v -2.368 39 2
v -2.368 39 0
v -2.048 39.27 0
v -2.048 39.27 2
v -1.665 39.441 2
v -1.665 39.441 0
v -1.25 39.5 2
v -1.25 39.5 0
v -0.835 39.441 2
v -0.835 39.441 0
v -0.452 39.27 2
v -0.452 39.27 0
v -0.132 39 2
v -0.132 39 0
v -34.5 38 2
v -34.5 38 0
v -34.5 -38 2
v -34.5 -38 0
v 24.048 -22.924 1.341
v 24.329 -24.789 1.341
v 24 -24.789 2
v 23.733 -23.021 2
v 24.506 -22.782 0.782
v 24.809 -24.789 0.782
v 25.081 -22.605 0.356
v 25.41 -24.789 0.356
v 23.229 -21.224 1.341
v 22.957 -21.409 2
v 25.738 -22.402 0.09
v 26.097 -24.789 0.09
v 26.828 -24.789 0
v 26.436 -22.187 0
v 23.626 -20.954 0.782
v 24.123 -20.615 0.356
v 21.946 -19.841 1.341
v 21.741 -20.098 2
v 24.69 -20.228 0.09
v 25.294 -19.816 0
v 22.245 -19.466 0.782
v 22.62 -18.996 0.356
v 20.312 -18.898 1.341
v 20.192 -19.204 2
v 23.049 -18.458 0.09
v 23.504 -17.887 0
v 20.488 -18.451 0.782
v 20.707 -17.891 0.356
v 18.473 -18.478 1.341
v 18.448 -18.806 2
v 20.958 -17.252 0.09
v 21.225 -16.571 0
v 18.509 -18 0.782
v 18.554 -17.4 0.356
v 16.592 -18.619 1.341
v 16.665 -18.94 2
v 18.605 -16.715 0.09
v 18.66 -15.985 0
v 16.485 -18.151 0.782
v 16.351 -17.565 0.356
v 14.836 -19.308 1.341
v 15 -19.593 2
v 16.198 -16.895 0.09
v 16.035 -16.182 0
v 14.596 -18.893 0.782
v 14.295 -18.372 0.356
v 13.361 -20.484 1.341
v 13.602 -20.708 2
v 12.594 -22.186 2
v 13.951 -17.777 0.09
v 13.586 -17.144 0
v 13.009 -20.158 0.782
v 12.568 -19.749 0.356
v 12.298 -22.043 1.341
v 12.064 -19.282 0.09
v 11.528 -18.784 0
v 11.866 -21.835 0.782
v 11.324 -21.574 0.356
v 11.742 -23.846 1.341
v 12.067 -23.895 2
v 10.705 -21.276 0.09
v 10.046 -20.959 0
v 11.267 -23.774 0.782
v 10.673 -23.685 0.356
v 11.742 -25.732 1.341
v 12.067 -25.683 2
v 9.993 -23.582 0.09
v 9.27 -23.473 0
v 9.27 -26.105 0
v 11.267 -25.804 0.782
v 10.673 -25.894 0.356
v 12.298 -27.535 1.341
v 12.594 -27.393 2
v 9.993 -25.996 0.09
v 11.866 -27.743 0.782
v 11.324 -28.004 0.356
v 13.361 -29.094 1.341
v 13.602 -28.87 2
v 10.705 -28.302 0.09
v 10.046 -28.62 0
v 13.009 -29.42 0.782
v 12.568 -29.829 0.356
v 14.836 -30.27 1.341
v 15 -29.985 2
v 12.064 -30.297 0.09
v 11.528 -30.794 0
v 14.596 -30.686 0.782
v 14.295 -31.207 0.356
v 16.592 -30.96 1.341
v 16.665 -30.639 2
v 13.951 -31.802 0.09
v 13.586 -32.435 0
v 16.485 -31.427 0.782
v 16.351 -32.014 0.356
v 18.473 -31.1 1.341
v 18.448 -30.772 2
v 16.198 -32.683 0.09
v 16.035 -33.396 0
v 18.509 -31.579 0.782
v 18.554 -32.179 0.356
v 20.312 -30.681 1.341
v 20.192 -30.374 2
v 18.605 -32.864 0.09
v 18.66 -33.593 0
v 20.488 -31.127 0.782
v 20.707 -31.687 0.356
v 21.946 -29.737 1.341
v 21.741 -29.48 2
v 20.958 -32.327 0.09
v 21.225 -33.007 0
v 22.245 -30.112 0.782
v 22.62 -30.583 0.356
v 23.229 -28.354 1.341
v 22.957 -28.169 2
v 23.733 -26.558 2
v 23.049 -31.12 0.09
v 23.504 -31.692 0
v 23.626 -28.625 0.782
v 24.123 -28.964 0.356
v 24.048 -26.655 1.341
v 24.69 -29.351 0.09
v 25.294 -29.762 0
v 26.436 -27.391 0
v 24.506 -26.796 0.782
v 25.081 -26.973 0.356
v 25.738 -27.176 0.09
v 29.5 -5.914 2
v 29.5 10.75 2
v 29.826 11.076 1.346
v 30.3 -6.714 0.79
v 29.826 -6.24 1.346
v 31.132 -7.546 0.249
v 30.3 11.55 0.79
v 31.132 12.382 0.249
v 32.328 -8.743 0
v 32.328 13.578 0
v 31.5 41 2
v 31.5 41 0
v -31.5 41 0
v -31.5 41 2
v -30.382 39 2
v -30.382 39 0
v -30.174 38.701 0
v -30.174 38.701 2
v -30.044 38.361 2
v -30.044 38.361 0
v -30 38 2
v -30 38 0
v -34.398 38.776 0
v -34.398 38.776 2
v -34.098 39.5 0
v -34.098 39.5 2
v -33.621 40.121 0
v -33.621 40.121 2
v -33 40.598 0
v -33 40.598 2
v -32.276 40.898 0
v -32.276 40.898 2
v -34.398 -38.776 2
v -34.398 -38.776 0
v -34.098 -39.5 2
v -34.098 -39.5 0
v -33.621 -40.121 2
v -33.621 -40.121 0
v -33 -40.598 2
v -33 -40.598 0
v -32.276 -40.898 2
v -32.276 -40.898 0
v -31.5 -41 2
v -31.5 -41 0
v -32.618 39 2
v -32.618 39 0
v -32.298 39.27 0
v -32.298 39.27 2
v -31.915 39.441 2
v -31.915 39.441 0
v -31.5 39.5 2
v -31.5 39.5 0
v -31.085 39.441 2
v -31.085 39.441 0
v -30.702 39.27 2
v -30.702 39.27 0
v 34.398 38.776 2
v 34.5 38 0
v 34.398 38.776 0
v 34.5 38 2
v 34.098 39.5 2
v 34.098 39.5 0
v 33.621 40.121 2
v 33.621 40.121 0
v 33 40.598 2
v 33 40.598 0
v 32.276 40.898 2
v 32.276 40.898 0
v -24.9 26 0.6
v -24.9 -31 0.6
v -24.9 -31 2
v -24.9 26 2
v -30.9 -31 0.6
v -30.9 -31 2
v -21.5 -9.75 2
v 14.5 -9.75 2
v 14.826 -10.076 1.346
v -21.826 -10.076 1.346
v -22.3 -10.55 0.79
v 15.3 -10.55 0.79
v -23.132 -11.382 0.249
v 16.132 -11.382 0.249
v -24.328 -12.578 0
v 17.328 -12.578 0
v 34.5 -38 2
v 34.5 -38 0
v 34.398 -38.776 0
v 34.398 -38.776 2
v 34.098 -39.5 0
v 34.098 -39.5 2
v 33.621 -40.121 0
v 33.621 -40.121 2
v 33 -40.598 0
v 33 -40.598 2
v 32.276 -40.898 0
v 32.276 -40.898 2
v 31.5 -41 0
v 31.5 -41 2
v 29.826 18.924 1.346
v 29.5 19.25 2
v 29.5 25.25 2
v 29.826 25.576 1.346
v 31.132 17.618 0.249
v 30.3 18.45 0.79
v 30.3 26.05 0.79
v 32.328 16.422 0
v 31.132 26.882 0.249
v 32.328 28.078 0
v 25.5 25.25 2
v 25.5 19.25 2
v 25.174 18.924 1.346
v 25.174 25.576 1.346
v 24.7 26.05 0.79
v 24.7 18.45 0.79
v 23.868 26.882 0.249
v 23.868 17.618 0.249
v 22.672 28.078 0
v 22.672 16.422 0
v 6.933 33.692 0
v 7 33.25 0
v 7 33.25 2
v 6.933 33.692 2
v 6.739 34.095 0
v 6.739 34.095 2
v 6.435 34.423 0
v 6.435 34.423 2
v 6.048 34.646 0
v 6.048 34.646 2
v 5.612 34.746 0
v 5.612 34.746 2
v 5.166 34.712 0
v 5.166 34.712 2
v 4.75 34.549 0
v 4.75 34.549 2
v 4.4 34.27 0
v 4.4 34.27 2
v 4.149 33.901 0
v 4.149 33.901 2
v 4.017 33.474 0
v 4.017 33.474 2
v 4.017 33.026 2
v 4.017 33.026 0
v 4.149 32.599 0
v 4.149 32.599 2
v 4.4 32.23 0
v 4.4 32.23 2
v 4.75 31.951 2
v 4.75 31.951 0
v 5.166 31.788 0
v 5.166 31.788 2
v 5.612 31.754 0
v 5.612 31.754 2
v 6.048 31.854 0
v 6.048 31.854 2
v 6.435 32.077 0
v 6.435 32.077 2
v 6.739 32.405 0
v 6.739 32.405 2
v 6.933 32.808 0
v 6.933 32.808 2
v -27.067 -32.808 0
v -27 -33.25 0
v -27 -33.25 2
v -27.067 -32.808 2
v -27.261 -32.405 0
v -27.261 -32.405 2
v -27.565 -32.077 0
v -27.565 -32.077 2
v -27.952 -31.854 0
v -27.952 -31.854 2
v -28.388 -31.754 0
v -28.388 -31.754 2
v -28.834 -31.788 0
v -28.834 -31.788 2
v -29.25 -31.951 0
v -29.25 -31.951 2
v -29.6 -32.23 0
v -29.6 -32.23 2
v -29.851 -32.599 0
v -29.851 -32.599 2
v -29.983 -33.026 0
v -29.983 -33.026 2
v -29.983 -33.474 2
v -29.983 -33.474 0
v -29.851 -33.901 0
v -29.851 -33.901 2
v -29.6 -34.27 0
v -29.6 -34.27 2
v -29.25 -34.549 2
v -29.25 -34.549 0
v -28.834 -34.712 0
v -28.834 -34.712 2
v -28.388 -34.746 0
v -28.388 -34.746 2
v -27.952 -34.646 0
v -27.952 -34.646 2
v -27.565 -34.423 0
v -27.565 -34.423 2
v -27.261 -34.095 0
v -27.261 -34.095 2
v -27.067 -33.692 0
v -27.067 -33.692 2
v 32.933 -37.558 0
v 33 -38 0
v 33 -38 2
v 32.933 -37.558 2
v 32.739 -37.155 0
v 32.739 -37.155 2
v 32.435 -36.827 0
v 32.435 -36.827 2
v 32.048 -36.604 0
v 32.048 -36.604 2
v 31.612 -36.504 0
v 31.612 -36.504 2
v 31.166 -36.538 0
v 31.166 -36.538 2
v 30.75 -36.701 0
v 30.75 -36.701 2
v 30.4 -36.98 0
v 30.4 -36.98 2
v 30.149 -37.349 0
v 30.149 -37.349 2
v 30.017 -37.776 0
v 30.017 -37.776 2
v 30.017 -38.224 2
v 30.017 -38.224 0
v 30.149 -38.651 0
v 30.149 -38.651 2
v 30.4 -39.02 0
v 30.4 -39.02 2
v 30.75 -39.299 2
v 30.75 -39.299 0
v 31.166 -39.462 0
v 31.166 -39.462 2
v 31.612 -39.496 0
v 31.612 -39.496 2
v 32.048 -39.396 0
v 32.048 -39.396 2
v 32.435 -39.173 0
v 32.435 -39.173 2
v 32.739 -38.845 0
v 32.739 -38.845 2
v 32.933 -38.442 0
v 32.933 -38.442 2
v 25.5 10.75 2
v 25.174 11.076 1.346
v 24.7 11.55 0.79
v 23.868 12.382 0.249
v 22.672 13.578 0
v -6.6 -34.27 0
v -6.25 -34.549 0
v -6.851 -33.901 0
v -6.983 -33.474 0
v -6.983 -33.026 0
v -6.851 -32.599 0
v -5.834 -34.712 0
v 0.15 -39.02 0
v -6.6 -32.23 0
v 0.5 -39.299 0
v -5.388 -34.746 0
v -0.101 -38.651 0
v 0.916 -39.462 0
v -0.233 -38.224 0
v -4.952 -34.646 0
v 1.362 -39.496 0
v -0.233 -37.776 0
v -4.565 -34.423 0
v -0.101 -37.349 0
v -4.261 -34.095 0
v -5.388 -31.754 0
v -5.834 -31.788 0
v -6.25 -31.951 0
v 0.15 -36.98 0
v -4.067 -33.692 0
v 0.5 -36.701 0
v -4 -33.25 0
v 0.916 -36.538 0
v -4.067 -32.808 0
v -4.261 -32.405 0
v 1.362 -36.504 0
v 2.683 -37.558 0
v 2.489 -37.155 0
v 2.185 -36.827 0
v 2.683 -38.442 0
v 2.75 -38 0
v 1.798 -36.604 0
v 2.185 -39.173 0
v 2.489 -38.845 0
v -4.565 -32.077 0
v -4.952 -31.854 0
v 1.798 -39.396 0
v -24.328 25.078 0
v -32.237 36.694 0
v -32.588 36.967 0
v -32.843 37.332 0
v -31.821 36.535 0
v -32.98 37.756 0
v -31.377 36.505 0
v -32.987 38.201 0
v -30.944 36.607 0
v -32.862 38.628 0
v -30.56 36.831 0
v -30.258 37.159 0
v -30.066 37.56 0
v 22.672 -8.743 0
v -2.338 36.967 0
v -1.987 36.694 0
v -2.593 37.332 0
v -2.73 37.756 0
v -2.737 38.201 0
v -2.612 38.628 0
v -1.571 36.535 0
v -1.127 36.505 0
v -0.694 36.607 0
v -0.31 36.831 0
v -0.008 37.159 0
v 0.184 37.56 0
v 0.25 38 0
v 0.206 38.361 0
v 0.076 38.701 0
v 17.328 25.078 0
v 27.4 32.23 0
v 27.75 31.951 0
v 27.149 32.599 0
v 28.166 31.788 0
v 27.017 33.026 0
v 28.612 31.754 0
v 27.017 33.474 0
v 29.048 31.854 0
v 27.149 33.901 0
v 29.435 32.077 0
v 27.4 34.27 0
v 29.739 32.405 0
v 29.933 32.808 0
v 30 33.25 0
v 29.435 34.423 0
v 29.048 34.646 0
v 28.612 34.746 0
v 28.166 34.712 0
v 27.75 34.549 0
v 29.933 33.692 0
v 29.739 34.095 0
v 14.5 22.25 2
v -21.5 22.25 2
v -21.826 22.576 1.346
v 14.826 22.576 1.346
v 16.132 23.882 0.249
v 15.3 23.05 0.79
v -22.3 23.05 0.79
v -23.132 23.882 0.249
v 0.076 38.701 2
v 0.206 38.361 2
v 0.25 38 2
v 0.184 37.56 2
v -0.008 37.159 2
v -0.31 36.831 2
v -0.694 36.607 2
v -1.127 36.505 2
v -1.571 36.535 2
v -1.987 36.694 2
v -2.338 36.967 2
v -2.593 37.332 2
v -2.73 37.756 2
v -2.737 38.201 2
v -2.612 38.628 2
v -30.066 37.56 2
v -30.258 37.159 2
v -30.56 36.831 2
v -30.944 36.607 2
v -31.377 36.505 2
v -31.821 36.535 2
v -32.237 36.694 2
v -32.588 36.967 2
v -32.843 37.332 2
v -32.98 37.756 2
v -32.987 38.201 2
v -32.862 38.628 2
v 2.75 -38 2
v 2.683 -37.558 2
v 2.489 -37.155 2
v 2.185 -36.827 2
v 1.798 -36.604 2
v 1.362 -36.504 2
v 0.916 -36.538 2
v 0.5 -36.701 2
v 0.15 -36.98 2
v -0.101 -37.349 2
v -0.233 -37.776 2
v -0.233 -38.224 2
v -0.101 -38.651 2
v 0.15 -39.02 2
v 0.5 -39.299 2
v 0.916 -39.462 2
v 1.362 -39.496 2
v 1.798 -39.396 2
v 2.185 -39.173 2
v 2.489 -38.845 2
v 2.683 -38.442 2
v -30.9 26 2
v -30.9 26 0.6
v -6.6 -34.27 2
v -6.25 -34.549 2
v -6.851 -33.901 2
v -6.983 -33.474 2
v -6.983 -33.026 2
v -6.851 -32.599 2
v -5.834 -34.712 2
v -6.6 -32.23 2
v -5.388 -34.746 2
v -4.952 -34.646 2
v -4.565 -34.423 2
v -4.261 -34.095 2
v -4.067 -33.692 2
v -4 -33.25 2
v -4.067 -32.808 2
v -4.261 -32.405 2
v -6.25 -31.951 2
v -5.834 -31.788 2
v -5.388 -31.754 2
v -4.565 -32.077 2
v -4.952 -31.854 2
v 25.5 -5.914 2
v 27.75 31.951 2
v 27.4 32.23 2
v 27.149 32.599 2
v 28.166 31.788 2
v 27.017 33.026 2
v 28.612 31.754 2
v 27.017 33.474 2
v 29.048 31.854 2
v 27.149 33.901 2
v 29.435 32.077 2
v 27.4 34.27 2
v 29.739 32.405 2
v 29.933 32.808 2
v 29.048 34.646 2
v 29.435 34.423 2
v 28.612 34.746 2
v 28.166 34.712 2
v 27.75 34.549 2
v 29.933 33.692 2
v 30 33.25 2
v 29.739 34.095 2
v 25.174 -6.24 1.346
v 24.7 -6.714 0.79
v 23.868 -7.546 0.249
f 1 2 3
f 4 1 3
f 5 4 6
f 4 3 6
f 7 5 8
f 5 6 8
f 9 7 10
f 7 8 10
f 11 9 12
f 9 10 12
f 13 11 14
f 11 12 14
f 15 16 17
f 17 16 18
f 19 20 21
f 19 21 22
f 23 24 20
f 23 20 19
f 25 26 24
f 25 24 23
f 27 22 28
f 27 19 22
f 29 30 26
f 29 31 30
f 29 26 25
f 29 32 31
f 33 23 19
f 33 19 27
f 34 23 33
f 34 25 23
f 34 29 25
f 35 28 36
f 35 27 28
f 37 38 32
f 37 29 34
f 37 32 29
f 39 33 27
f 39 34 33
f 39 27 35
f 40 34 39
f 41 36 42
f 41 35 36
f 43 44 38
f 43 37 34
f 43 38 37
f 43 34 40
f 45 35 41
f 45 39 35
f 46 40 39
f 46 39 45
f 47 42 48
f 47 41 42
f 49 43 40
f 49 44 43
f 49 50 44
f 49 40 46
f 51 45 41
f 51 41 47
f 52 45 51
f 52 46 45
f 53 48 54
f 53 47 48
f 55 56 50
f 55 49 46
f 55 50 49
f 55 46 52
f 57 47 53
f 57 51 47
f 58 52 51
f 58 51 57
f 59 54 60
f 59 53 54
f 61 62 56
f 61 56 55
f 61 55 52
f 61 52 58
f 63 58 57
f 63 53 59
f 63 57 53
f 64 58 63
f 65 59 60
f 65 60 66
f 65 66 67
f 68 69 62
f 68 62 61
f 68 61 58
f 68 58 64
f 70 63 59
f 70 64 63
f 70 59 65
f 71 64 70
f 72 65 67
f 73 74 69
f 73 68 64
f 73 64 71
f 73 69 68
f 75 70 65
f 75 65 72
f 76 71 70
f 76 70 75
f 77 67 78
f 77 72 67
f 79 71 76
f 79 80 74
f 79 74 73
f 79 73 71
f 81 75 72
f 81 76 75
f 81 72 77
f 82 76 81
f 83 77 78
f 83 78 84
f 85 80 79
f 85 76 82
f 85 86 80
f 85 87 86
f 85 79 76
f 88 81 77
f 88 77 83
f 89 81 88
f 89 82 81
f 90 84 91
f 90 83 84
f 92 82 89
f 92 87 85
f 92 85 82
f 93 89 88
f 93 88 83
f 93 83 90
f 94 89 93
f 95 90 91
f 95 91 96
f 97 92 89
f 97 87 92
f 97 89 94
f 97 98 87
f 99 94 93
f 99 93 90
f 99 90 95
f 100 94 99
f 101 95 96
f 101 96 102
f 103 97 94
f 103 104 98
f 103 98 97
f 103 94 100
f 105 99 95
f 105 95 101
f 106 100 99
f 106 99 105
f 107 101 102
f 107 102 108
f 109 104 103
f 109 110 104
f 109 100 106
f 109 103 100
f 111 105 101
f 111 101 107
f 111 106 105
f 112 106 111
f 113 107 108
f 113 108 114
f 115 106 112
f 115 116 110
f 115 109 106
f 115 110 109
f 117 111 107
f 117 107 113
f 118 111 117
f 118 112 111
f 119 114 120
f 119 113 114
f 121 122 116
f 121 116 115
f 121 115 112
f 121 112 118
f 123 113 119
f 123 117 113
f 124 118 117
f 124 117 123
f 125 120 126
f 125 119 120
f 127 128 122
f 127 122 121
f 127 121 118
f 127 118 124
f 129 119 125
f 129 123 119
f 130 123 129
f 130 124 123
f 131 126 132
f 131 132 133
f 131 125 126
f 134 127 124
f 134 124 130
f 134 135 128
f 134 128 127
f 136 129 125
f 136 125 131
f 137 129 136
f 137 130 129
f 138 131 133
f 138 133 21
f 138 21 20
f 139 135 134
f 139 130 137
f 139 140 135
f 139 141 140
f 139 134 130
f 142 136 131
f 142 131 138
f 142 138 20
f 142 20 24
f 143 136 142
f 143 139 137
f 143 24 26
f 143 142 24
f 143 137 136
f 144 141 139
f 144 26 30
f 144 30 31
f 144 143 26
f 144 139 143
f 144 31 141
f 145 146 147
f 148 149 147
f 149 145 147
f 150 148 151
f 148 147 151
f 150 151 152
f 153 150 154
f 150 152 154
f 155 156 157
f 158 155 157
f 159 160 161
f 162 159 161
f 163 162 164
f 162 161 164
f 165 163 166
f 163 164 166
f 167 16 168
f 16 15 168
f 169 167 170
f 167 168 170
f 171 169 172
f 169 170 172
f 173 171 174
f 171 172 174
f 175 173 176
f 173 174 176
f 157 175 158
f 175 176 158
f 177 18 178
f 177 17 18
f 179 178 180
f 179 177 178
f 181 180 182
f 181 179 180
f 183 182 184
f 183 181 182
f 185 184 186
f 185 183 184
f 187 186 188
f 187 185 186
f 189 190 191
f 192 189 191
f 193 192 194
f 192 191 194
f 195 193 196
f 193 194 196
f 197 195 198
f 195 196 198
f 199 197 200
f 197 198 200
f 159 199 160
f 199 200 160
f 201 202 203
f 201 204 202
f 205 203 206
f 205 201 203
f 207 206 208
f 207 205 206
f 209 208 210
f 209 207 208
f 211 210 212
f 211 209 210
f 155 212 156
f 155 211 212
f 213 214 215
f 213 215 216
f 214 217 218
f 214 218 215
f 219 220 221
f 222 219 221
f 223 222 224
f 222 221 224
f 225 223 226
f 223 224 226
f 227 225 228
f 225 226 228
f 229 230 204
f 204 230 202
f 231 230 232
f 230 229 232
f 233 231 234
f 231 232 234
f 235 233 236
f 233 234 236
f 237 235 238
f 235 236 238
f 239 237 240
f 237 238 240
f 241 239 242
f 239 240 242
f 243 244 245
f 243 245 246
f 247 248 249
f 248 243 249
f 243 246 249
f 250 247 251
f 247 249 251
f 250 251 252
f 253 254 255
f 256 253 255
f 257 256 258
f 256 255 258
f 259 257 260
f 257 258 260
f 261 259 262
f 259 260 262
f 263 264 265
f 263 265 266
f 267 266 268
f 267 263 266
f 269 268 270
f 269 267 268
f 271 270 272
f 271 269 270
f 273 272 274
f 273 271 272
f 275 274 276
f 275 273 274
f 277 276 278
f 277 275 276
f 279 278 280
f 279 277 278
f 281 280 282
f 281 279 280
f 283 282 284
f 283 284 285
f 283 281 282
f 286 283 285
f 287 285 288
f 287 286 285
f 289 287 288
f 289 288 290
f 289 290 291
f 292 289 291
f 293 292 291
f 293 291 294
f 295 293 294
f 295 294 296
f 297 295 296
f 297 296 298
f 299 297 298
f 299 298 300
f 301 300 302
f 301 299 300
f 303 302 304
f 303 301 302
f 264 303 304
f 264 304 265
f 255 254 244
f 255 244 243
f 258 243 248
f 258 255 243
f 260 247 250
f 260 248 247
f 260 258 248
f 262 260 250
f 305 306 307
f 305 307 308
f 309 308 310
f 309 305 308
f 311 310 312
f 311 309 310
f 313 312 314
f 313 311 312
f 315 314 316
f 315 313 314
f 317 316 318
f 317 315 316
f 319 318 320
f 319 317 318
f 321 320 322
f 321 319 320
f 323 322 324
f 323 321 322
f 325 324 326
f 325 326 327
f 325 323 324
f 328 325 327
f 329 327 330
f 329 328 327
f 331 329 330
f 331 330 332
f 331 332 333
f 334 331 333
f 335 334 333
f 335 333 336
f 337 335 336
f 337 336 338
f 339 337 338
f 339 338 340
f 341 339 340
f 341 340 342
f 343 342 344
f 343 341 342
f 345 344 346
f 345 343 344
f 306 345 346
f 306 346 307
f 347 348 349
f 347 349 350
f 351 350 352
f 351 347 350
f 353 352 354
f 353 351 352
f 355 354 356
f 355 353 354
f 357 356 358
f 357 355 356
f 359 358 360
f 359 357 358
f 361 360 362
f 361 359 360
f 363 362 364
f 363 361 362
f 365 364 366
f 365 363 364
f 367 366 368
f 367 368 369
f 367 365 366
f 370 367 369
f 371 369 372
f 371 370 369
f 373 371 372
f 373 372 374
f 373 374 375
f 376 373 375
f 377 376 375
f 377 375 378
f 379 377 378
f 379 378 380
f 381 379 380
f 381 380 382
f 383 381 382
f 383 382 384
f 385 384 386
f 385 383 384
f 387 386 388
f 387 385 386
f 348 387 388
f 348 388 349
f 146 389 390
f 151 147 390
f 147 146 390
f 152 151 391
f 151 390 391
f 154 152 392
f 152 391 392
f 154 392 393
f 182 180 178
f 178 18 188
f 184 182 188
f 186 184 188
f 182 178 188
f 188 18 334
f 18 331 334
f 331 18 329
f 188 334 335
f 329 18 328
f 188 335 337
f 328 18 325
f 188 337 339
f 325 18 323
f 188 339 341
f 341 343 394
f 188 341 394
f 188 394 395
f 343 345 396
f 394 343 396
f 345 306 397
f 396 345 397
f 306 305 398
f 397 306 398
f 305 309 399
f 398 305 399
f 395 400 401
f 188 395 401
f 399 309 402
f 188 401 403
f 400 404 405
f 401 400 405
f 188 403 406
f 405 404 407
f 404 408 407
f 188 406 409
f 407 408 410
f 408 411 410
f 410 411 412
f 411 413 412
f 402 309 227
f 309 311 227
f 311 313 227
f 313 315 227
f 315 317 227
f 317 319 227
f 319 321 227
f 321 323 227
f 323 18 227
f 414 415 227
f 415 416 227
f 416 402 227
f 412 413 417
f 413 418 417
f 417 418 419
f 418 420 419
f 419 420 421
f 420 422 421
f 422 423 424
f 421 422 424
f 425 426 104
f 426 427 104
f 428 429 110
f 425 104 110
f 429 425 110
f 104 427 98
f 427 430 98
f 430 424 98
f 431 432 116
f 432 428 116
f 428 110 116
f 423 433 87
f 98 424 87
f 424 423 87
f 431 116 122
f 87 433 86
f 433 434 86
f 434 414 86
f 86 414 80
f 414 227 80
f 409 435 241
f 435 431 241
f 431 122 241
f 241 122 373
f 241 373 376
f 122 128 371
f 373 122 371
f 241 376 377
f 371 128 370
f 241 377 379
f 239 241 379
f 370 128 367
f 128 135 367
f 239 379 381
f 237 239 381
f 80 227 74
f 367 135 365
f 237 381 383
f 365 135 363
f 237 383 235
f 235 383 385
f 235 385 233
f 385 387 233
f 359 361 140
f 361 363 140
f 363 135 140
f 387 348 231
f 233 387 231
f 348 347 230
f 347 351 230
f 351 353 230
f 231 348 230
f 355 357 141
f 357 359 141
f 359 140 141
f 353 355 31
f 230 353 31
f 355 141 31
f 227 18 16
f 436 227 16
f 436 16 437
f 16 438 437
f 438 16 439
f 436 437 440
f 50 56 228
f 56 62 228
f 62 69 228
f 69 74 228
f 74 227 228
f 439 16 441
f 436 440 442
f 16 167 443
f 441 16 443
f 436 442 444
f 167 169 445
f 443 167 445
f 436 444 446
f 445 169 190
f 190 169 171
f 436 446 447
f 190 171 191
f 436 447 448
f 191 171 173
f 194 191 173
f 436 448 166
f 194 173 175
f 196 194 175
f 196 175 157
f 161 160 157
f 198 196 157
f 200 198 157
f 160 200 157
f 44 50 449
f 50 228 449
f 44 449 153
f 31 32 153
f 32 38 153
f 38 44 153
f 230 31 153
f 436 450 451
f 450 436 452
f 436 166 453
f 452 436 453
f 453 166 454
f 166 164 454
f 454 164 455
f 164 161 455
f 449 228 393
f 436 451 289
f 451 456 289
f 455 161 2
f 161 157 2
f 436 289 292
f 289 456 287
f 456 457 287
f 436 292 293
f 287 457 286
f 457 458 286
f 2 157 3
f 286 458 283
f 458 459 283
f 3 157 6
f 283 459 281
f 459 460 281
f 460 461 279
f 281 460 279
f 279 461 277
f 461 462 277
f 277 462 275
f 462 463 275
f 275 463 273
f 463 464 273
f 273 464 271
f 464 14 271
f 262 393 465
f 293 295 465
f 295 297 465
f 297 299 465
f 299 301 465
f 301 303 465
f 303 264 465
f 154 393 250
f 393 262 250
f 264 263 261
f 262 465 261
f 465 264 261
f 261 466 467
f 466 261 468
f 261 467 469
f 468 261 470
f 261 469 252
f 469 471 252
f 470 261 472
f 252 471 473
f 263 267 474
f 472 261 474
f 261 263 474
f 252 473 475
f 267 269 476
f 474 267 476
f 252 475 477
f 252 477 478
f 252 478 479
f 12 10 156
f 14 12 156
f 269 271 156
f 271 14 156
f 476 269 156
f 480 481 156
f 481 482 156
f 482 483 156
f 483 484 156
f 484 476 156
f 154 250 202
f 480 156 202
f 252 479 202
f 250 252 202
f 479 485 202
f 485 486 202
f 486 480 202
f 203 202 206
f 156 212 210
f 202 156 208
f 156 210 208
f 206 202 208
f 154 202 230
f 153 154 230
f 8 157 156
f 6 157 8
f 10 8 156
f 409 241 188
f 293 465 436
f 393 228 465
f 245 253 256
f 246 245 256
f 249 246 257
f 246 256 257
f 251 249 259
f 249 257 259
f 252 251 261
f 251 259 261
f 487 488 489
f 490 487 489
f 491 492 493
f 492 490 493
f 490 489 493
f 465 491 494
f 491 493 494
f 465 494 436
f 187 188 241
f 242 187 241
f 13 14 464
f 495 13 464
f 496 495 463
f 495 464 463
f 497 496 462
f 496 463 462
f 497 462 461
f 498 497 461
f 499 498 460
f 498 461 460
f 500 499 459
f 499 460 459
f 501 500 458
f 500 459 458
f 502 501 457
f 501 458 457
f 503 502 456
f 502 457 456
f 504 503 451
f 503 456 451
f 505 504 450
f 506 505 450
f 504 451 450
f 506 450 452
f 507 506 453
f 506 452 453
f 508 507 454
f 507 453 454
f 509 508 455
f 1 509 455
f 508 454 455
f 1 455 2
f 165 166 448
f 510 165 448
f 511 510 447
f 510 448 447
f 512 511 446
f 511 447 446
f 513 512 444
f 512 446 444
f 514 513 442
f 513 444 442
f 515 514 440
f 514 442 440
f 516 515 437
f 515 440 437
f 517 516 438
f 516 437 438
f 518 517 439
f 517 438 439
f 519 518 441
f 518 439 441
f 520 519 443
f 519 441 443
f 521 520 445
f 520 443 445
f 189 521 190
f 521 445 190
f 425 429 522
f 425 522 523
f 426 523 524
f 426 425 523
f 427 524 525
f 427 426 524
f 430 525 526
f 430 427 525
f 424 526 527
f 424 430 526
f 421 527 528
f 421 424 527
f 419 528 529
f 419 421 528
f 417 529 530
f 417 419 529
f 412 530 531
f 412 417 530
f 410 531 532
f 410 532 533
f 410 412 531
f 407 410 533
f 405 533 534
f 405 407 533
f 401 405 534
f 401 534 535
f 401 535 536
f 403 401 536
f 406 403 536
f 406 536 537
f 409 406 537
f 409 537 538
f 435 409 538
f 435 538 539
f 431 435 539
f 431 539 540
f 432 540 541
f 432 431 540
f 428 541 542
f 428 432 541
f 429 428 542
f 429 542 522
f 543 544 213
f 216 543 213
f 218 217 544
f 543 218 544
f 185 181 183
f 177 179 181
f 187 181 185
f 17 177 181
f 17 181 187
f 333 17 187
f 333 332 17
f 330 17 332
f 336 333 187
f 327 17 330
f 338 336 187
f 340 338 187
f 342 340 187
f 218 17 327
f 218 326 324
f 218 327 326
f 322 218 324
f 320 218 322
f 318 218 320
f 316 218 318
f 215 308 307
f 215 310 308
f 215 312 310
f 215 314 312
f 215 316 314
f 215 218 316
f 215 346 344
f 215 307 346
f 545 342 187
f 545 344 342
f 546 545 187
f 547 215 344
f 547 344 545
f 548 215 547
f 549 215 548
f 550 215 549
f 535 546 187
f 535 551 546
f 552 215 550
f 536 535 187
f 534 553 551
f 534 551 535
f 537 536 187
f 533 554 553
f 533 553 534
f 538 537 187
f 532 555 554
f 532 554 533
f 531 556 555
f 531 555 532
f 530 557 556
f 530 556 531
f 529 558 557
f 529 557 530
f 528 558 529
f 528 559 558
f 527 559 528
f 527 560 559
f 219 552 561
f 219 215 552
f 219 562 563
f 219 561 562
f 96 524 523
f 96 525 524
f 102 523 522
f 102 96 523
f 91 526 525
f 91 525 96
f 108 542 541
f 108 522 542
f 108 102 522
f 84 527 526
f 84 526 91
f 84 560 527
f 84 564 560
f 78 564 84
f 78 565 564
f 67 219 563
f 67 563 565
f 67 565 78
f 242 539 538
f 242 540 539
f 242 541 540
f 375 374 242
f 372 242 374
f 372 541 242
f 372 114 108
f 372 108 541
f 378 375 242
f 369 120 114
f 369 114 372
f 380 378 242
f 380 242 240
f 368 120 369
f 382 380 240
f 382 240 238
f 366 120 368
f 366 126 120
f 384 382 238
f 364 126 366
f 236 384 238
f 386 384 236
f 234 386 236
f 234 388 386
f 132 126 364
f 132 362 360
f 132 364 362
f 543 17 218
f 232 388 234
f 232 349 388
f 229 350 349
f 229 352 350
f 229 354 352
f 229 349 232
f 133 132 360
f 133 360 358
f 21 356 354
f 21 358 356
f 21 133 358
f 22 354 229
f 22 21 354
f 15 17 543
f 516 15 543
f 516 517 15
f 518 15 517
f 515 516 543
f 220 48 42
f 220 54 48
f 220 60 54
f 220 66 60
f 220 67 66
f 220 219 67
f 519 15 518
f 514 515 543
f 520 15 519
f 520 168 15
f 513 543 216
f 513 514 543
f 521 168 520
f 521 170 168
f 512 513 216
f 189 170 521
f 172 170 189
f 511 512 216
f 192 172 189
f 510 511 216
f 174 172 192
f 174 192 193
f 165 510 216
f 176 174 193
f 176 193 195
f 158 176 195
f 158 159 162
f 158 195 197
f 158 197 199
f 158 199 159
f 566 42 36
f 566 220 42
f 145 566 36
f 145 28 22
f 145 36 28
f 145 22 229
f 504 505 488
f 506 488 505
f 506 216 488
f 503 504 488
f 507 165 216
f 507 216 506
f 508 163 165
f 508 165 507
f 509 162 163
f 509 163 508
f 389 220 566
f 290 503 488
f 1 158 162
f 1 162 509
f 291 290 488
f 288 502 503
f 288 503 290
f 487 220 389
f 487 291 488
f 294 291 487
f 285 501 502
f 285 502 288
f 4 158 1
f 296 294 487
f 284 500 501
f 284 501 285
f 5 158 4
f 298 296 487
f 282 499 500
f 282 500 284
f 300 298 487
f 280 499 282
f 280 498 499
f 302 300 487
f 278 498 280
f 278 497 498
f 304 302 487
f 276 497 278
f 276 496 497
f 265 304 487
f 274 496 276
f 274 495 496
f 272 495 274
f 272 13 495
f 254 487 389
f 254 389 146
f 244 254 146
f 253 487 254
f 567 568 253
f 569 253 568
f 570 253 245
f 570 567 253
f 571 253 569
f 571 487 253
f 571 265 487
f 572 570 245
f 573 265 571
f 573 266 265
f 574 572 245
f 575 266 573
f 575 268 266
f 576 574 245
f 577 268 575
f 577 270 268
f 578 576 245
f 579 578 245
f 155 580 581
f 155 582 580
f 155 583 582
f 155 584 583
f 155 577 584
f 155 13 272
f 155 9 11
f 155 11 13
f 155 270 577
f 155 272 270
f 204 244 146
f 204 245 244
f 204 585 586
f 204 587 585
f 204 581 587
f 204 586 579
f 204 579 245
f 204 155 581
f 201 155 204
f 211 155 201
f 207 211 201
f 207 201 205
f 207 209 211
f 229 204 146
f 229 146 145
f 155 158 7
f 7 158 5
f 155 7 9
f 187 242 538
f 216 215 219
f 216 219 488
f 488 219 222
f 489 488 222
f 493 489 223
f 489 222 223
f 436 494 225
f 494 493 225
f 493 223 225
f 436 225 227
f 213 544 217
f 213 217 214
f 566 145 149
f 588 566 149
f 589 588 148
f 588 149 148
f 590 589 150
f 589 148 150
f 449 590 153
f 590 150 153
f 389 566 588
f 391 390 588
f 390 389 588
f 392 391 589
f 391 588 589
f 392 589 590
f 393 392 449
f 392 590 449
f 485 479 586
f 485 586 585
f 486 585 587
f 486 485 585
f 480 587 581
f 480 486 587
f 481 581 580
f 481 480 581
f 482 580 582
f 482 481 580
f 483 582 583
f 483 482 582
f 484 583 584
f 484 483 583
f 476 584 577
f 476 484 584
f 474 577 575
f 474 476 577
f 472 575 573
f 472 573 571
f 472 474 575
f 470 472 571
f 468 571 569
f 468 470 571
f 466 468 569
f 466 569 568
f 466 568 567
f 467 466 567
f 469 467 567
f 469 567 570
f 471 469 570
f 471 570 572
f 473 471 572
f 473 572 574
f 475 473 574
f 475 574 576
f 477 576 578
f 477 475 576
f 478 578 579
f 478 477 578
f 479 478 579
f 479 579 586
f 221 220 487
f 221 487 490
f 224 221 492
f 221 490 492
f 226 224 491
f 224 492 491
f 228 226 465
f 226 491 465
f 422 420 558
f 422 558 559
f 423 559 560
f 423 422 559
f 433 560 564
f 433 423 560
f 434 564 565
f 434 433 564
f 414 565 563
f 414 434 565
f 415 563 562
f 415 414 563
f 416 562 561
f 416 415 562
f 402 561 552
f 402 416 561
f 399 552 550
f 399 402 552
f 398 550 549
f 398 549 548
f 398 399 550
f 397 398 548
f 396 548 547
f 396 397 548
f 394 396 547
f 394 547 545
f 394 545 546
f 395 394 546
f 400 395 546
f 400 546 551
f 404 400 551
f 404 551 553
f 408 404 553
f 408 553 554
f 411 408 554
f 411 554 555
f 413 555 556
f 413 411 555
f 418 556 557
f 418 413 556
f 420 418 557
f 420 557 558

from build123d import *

# Parameters (mm, degrees)
F0_R          = 1.5
F0_R_2        = 6
F0_W          = 6
F0_H          = 57
F0_W_2        = 36
F0_H_2        = 32
F0_W_3        = 4
F0_H_3        = 16.6644380502
F0_H_4        = 6
F0_W_4        = 4.7
F0_H_5        = 2
F0_W_5        = 13
F0_W_6        = 2.3
F0_W_7        = 1.5
F0_W_8        = 9
F0_W_9        = 11
F1_DEPTH      = 2
F2_T1_DEPTH   = 16.6644380502
F2_T3_DEPTH   = 4
F2_T5_DEPTH   = 6
F2_T7_DEPTH   = 32
F2_T9_DEPTH   = 36
F2_T17_DEPTH  = 11.0710678119
F2_T21_DEPTH  = 23.7355058621
F2_T28_DEPTH  = 11.0710678119
F2_T32_DEPTH  = 23.7355058621
F2_T39_DEPTH  = 23.7355058621
F2_T43_DEPTH  = 11.0710678119
F2_T51_DEPTH  = 11.0710678119
F2_T56_DEPTH  = 23.7355058621
F2_T63_DEPTH  = 13.0710678119
F2_T67_DEPTH  = 11.0710678119
F2_T75_DEPTH  = 13.0710678119
F2_T79_DEPTH  = 11.0710678119
F2_T86_DEPTH  = 11.0710678119
F2_T91_DEPTH  = 13.0710678119
F2_S93_R      = 1.5
F2_T94_DEPTH  = 8
F2_T100_DEPTH = 13.0710678119
F2_T104_DEPTH = 11.0710678119
F2_T111_DEPTH = 43.0710678119
F2_T115_DEPTH = 39.0710678119
F2_T122_DEPTH = 39.0710678119
F2_T126_DEPTH = 43.0710678119
F2_T133_DEPTH = 39.0710678119
F2_T137_DEPTH = 43.0710678119
F2_T145_DEPTH = 39.0710678119
F2_T149_DEPTH = 43.0710678119
F3_R          = 3
F4_DEPTH      = 0.6


# Not quite as in the source:
# - a fillet or chamfer that OpenCascade refuses, or shapes differently, is made with other operations: its cross-section is extruded or revolved along the edge and cut away or added


with BuildPart() as f1:
    # F0 (on Top) → F1 (new body)
    with BuildSketch(Plane.XY):
        with BuildLine():
            Line((12.5, -41), (34.5, -41))
            Line((34.5, -41), (34.5, 39))
            Line((34.5, 39), (28.5, 39))
            Line((28.5, 39), (25.5, 39))
            Line((25.5, 39), (20.8, 39))
            Line((20.8, 39), (7.8, 39))
            Line((7.8, 39), (5.5, 39))
            Line((5.5, 39), (-0.1319660113, 39))
            ThreePointArc((-0.1319660113, 39), (0.1512585384, 38.5352331347), (0.25, 38))
            ThreePointArc((0.25, 38), (-1.7852331347, 36.5987414616), (-2.3680339887, 39))
            Line((-2.3680339887, 39), (-5.5, 39))
            Line((-5.5, 39), (-14.5, 39))
            Line((-14.5, 39), (-25.5, 39))
            Line((-25.5, 39), (-27, 39))
            Line((-27, 39), (-28.5, 39))
            Line((-28.5, 39), (-30.3819660113, 39))
            ThreePointArc((-30.3819660113, 39), (-30.0987414616, 38.5352331347), (-30, 38))
            ThreePointArc((-30, 38), (-32.0352331347, 36.5987414616), (-32.6180339887, 39))
            Line((-32.6180339887, 39), (-34.5, 39))
            Line((-34.5, 39), (-34.5, -41))
            Line((-34.5, -41), (-12.5, -41))
            Line((-12.5, -41), (-10.5, -41))
            Line((-10.5, -41), (10.5, -41))
            Line((10.5, -41), (12.5, -41))
        make_face()
        with Locations((-28.5, -33.25)):
            Circle(F0_R, mode=Mode.SUBTRACT)
        with Locations((-5.5, -33.25)):
            Circle(F0_R, mode=Mode.SUBTRACT)
        with Locations((1.25, -38)):
            Circle(F0_R, mode=Mode.SUBTRACT)
        with Locations((31.5, -38)):
            Circle(F0_R, mode=Mode.SUBTRACT)
        with Locations((18, -24.7891994715)):
            Circle(F0_R_2, mode=Mode.SUBTRACT)
        with Locations((-27.9, -2.5)):
            Rectangle(F0_W, F0_H, mode=Mode.SUBTRACT)
        with Locations((-3.5, 6.25)):
            Rectangle(F0_W_2, F0_H_2, mode=Mode.SUBTRACT)
        with Locations((-28.5, 33.25)):
            Circle(F0_R, mode=Mode.SUBTRACT)
        with Locations((-5.5, 33.25)):
            Circle(F0_R, mode=Mode.SUBTRACT)
        with Locations((27.5, 2.4177809749)):
            Rectangle(F0_W_3, F0_H_3, mode=Mode.SUBTRACT)
        with Locations((5.5, 33.25)):
            Circle(F0_R, mode=Mode.SUBTRACT)
        with Locations((27.5, 22.25)):
            Rectangle(F0_W_3, F0_H_4, mode=Mode.SUBTRACT)
        with Locations((28.5, 33.25)):
            Circle(F0_R, mode=Mode.SUBTRACT)
        Polygon((28.5, 39), (34.5, 39), (34.5, 41), (28, 41), (25.5, 41), (25.5, 39), align=None)
        with Locations((23.15, 40)):
            Rectangle(F0_W_4, F0_H_5)
        with Locations((14.3, 40)):
            Rectangle(F0_W_5, F0_H_5)
        with Locations((6.65, 40)):
            Rectangle(F0_W_6, F0_H_5)
        with BuildLine():
            Line((-34.5, 41), (-34.5, 39))
            Line((-34.5, 39), (-32.6180339887, 39))
            ThreePointArc((-32.6180339887, 39), (-31.5, 39.5), (-30.3819660113, 39))
            Line((-30.3819660113, 39), (-28.5, 39))
            Line((-28.5, 39), (-27, 39))
            Line((-27, 39), (-27, 41))
            Line((-27, 41), (-34.5, 41))
        make_face()
        with BuildLine():
            Line((-0.1319660113, 39), (5.5, 39))
            Line((5.5, 39), (5.5, 41))
            Line((5.5, 41), (-5.5, 41))
            Line((-5.5, 41), (-5.5, 39))
            Line((-5.5, 39), (-2.3680339887, 39))
            ThreePointArc((-2.3680339887, 39), (-1.25, 39.5), (-0.1319660113, 39))
        make_face()
        with Locations((-26.25, 40)):
            Rectangle(F0_W_7, F0_H_5)
        with Locations((-10, 40)):
            Rectangle(F0_W_8, F0_H_5)
        with Locations((-20, 40)):
            Rectangle(F0_W_9, F0_H_5)
        with Locations((-28.5, 33.25)):
            Circle(F0_R)
        with Locations((-5.5, 33.25)):
            Circle(F0_R)
    extrude(amount=F1_DEPTH)

    # F2: fillet of radius 3 on 13 edges, made by hand

    # F2_s2 → F2_t1 (cut)
    with BuildSketch(Plane.XZ.offset(-10.75)):
        with BuildLine():
            ThreePointArc((25.5, 2), (24.4036236828, 0.5505102572), (22.6715728753, 0))
            Line((22.6715728753, 0), (25.5, 0))
            Line((25.5, 0), (25.5, 2))
        make_face()
        with BuildLine():
            ThreePointArc((29.5, 2), (30.5963763172, 0.5505102572), (32.3284271247, 0))
            Line((32.3284271247, 0), (29.5, 0))
            Line((29.5, 0), (29.5, 2))
        make_face()
    extrude(amount=F2_T1_DEPTH, mode=Mode.SUBTRACT)

    # F2_s4 → F2_t3 (cut)
    with BuildSketch(Plane.YZ.offset(25.5)):
        with BuildLine():
            ThreePointArc((-5.9144380502, 2), (-7.0108143674, 0.5505102572), (-8.742865175, 0))
            Line((-8.742865175, 0), (-5.9144380502, 0))
            Line((-5.9144380502, 0), (-5.9144380502, 2))
        make_face()
        with BuildLine():
            ThreePointArc((10.75, 2), (11.8463763172, 0.5505102572), (13.5784271247, 0))
            Line((13.5784271247, 0), (10.75, 0))
            Line((10.75, 0), (10.75, 2))
        make_face()
        with BuildLine():
            ThreePointArc((19.25, 2), (18.1536236828, 0.5505102572), (16.4215728753, 0))
            Line((16.4215728753, 0), (19.25, 0))
            Line((19.25, 0), (19.25, 2))
        make_face()
        with BuildLine():
            ThreePointArc((25.25, 2), (26.3463763172, 0.5505102572), (28.0784271247, 0))
            Line((28.0784271247, 0), (25.25, 0))
            Line((25.25, 0), (25.25, 2))
        make_face()
    extrude(amount=F2_T3_DEPTH, mode=Mode.SUBTRACT)

    # F2_s6 → F2_t5 (cut)
    with BuildSketch(Plane.XZ.offset(-25.25)):
        with BuildLine():
            ThreePointArc((29.5, 2), (30.5963763172, 0.5505102572), (32.3284271247, 0))
            Line((32.3284271247, 0), (29.5, 0))
            Line((29.5, 0), (29.5, 2))
        make_face()
        with BuildLine():
            ThreePointArc((25.5, 2), (24.4036236828, 0.5505102572), (22.6715728753, 0))
            Line((22.6715728753, 0), (25.5, 0))
            Line((25.5, 0), (25.5, 2))
        make_face()
    extrude(amount=F2_T5_DEPTH, mode=Mode.SUBTRACT)

    # F2_s8 → F2_t7 (cut)
    with BuildSketch(Plane.XZ.offset(-22.25)):
        with BuildLine():
            ThreePointArc((14.5, 2), (15.5963763172, 0.5505102572), (17.3284271247, 0))
            Line((17.3284271247, 0), (14.5, 0))
            Line((14.5, 0), (14.5, 2))
        make_face()
        with BuildLine():
            ThreePointArc((-21.5, 2), (-22.5963763172, 0.5505102572), (-24.3284271247, 0))
            Line((-24.3284271247, 0), (-21.5, 0))
            Line((-21.5, 0), (-21.5, 2))
        make_face()
    extrude(amount=F2_T7_DEPTH, mode=Mode.SUBTRACT)

    # F2_s10 → F2_t9 (cut)
    with BuildSketch(Plane.YZ.offset(-21.5)):
        with BuildLine():
            ThreePointArc((-9.75, 2), (-10.8463763172, 0.5505102572), (-12.5784271247, 0))
            Line((-12.5784271247, 0), (-9.75, 0))
            Line((-9.75, 0), (-9.75, 2))
        make_face()
        with BuildLine():
            ThreePointArc((22.25, 2), (23.3463763172, 0.5505102572), (25.0784271247, 0))
            Line((25.0784271247, 0), (22.25, 0))
            Line((22.25, 0), (22.25, 2))
        make_face()
    extrude(amount=F2_T9_DEPTH, mode=Mode.SUBTRACT)

    # F2_s11 → F2_t12 (revolve, cut)
    with BuildSketch(Plane.XZ.offset(24.7891994715)):
        with BuildLine():
            ThreePointArc((24, 2), (25.0963763172, 0.5505102572), (26.8284271247, 0))
            Line((26.8284271247, 0), (24, 0))
            Line((24, 0), (24, 2))
        make_face()
    revolve(axis=Axis((18, -24.7891994715, 0), (0, 0, 1)), mode=Mode.SUBTRACT)


with BuildPart() as f2_tool15:
    # F2_s16 → F2_t17 (new body)
    with BuildSketch(Plane.YZ.offset(29.5)):
        with BuildLine():
            ThreePointArc((-5.9144380502, 2), (-7.0108143674, 0.5505102572), (-8.742865175, 0))
            Line((-8.742865175, 0), (-5.9144380502, 0))
            Line((-5.9144380502, 0), (-5.9144380502, 2))
        make_face()
    extrude(amount=-F2_T17_DEPTH)

    split(bisect_by=Plane.YZ.offset(25.5), keep=Keep.BOTTOM)


with BuildPart() as f2_tool19:
    # F2_s20 → F2_t21 (new body)
    with BuildSketch(Plane.XZ.offset(12.9855058621)):
        with BuildLine():
            ThreePointArc((25.5, 2), (24.4036236828, 0.5505102572), (22.6715728753, 0))
            Line((22.6715728753, 0), (25.5, 0))
            Line((25.5, 0), (25.5, 2))
        make_face()
    extrude(amount=-F2_T21_DEPTH)

    split(bisect_by=Plane.XZ.offset(5.9144380502), keep=Keep.TOP)


with BuildPart() as f2_tool15_1:
    add(f2_tool15.part)

    # F2_t23: intersect F2_tool19
    add(f2_tool19.part, mode=Mode.INTERSECT)


with BuildPart() as f1_1:
    add(f1.part)

    # F2_t13: cut F2_tool15
    add(f2_tool15_1.part, mode=Mode.SUBTRACT)


with BuildPart() as f2_tool26:
    # F2_s27 → F2_t28 (new body)
    with BuildSketch(Plane.YZ.offset(18.4289321881)):
        with BuildLine():
            ThreePointArc((10.75, 2), (11.8463763172, 0.5505102572), (13.5784271247, 0))
            Line((13.5784271247, 0), (10.75, 0))
            Line((10.75, 0), (10.75, 2))
        make_face()
    extrude(amount=F2_T28_DEPTH)

    split(bisect_by=Plane.YZ.offset(25.5), keep=Keep.BOTTOM)


with BuildPart() as f2_tool30:
    # F2_s31 → F2_t32 (new body)
    with BuildSketch(Plane.XZ.offset(5.9144380502)):
        with BuildLine():
            ThreePointArc((25.5, 2), (24.4036236828, 0.5505102572), (22.6715728753, 0))
            Line((22.6715728753, 0), (25.5, 0))
            Line((25.5, 0), (25.5, 2))
        make_face()
    extrude(amount=-F2_T32_DEPTH)

    split(bisect_by=Plane.XZ.offset(-10.75), keep=Keep.BOTTOM)


with BuildPart() as f2_tool26_1:
    add(f2_tool26.part)

    # F2_t34: intersect F2_tool30
    add(f2_tool30.part, mode=Mode.INTERSECT)


with BuildPart() as f1_2:
    add(f1_1.part)

    # F2_t24: cut F2_tool26
    add(f2_tool26_1.part, mode=Mode.SUBTRACT)


with BuildPart() as f2_tool37:
    # F2_s38 → F2_t39 (new body)
    with BuildSketch(Plane.XZ.offset(-10.75)):
        with BuildLine():
            ThreePointArc((29.5, 2), (30.5963763172, 0.5505102572), (32.3284271247, 0))
            Line((32.3284271247, 0), (29.5, 0))
            Line((29.5, 0), (29.5, 2))
        make_face()
    extrude(amount=F2_T39_DEPTH)

    split(bisect_by=Plane.XZ.offset(5.9144380502), keep=Keep.TOP)


with BuildPart() as f2_tool41:
    # F2_s42 → F2_t43 (new body)
    with BuildSketch(Plane.YZ.offset(36.5710678119)):
        with BuildLine():
            ThreePointArc((-5.9144380502, 2), (-7.0108143674, 0.5505102572), (-8.742865175, 0))
            Line((-8.742865175, 0), (-5.9144380502, 0))
            Line((-5.9144380502, 0), (-5.9144380502, 2))
        make_face()
    extrude(amount=-F2_T43_DEPTH)

    split(bisect_by=Plane.YZ.offset(34.5), keep=Keep.BOTTOM)

    split(bisect_by=Plane.YZ.offset(29.5), keep=Keep.TOP)


with BuildPart() as f2_tool37_1:
    add(f2_tool37.part)

    # F2_t46: intersect F2_tool41
    add(f2_tool41.part, mode=Mode.INTERSECT)


with BuildPart() as f1_3:
    add(f1_2.part)

    # F2_t35: cut F2_tool37
    add(f2_tool37_1.part, mode=Mode.SUBTRACT)


with BuildPart() as f2_tool49:
    # F2_s50 → F2_t51 (new body)
    with BuildSketch(Plane.YZ.offset(25.5)):
        with BuildLine():
            ThreePointArc((10.75, 2), (11.8463763172, 0.5505102572), (13.5784271247, 0))
            Line((13.5784271247, 0), (10.75, 0))
            Line((10.75, 0), (10.75, 2))
        make_face()
    extrude(amount=F2_T51_DEPTH)

    split(bisect_by=Plane.YZ.offset(34.5), keep=Keep.BOTTOM)

    split(bisect_by=Plane.YZ.offset(29.5), keep=Keep.TOP)


with BuildPart() as f2_tool54:
    # F2_s55 → F2_t56 (new body)
    with BuildSketch(Plane.XZ.offset(-17.8210678119)):
        with BuildLine():
            ThreePointArc((29.5, 2), (30.5963763172, 0.5505102572), (32.3284271247, 0))
            Line((32.3284271247, 0), (29.5, 0))
            Line((29.5, 0), (29.5, 2))
        make_face()
    extrude(amount=F2_T56_DEPTH)

    split(bisect_by=Plane.XZ.offset(-10.75), keep=Keep.BOTTOM)


with BuildPart() as f2_tool49_1:
    add(f2_tool49.part)

    # F2_t58: intersect F2_tool54
    add(f2_tool54.part, mode=Mode.INTERSECT)


with BuildPart() as f1_4:
    add(f1_3.part)

    # F2_t47: cut F2_tool49
    add(f2_tool49_1.part, mode=Mode.SUBTRACT)


with BuildPart() as f2_tool61:
    # F2_s62 → F2_t63 (new body)
    with BuildSketch(Plane.XZ.offset(-25.25)):
        with BuildLine():
            ThreePointArc((29.5, 2), (30.5963763172, 0.5505102572), (32.3284271247, 0))
            Line((32.3284271247, 0), (29.5, 0))
            Line((29.5, 0), (29.5, 2))
        make_face()
    extrude(amount=F2_T63_DEPTH)

    split(bisect_by=Plane.XZ.offset(-19.25), keep=Keep.TOP)


with BuildPart() as f2_tool65:
    # F2_s66 → F2_t67 (new body)
    with BuildSketch(Plane.YZ.offset(36.5710678119)):
        with BuildLine():
            ThreePointArc((19.25, 2), (18.1536236828, 0.5505102572), (16.4215728753, 0))
            Line((16.4215728753, 0), (19.25, 0))
            Line((19.25, 0), (19.25, 2))
        make_face()
    extrude(amount=-F2_T67_DEPTH)

    split(bisect_by=Plane.YZ.offset(34.5), keep=Keep.BOTTOM)

    split(bisect_by=Plane.YZ.offset(29.5), keep=Keep.TOP)


with BuildPart() as f2_tool61_1:
    add(f2_tool61.part)

    # F2_t70: intersect F2_tool65
    add(f2_tool65.part, mode=Mode.INTERSECT)


with BuildPart() as f1_5:
    add(f1_4.part)

    # F2_t59: cut F2_tool61
    add(f2_tool61_1.part, mode=Mode.SUBTRACT)


with BuildPart() as f2_tool73:
    # F2_s74 → F2_t75 (new body)
    with BuildSketch(Plane.XZ.offset(-12.1789321881)):
        with BuildLine():
            ThreePointArc((25.5, 2), (24.4036236828, 0.5505102572), (22.6715728753, 0))
            Line((22.6715728753, 0), (25.5, 0))
            Line((25.5, 0), (25.5, 2))
        make_face()
    extrude(amount=-F2_T75_DEPTH)

    split(bisect_by=Plane.XZ.offset(-19.25), keep=Keep.TOP)


with BuildPart() as f2_tool77:
    # F2_s78 → F2_t79 (new body)
    with BuildSketch(Plane.YZ.offset(29.5)):
        with BuildLine():
            ThreePointArc((19.25, 2), (18.1536236828, 0.5505102572), (16.4215728753, 0))
            Line((16.4215728753, 0), (19.25, 0))
            Line((19.25, 0), (19.25, 2))
        make_face()
    extrude(amount=-F2_T79_DEPTH)

    split(bisect_by=Plane.YZ.offset(25.5), keep=Keep.BOTTOM)


with BuildPart() as f2_tool73_1:
    add(f2_tool73.part)

    # F2_t81: intersect F2_tool77
    add(f2_tool77.part, mode=Mode.INTERSECT)


with BuildPart() as f1_6:
    add(f1_5.part)

    # F2_t71: cut F2_tool73
    add(f2_tool73_1.part, mode=Mode.SUBTRACT)


with BuildPart() as f2_tool84:
    # F2_s85 → F2_t86 (new body)
    with BuildSketch(Plane.YZ.offset(25.5)):
        with BuildLine():
            ThreePointArc((25.25, 2), (26.3463763172, 0.5505102572), (28.0784271247, 0))
            Line((28.0784271247, 0), (25.25, 0))
            Line((25.25, 0), (25.25, 2))
        make_face()
    extrude(amount=F2_T86_DEPTH)

    split(bisect_by=Plane.YZ.offset(34.5), keep=Keep.BOTTOM)

    split(bisect_by=Plane.YZ.offset(29.5), keep=Keep.TOP)


with BuildPart() as f2_tool89:
    # F2_s90 → F2_t91 (new body)
    with BuildSketch(Plane.XZ.offset(-32.3210678119)):
        with BuildLine():
            ThreePointArc((29.5, 2), (30.5963763172, 0.5505102572), (32.3284271247, 0))
            Line((32.3284271247, 0), (29.5, 0))
            Line((29.5, 0), (29.5, 2))
        make_face()
    extrude(amount=F2_T91_DEPTH)

    split(bisect_by=Plane.XZ.offset(-25.25), keep=Keep.BOTTOM)

    # F2_s93 → F2_t94 (cut, symmetric)
    with BuildSketch(Plane.XY.offset(1)):
        with Locations((28.5, 33.25)):
            Circle(F2_S93_R)
    extrude(amount=F2_T94_DEPTH, both=True, mode=Mode.SUBTRACT)


with BuildPart() as f2_tool84_1:
    add(f2_tool84.part)

    # F2_t95: intersect F2_tool89
    add(f2_tool89.part, mode=Mode.INTERSECT)


with BuildPart() as f1_7:
    add(f1_6.part)

    # F2_t82: cut F2_tool84
    add(f2_tool84_1.part, mode=Mode.SUBTRACT)


with BuildPart() as f2_tool98:
    # F2_s99 → F2_t100 (new body)
    with BuildSketch(Plane.XZ.offset(-19.25)):
        with BuildLine():
            ThreePointArc((25.5, 2), (24.4036236828, 0.5505102572), (22.6715728753, 0))
            Line((22.6715728753, 0), (25.5, 0))
            Line((25.5, 0), (25.5, 2))
        make_face()
    extrude(amount=-F2_T100_DEPTH)

    split(bisect_by=Plane.XZ.offset(-25.25), keep=Keep.BOTTOM)


with BuildPart() as f2_tool102:
    # F2_s103 → F2_t104 (new body)
    with BuildSketch(Plane.YZ.offset(18.4289321881)):
        with BuildLine():
            ThreePointArc((25.25, 2), (26.3463763172, 0.5505102572), (28.0784271247, 0))
            Line((28.0784271247, 0), (25.25, 0))
            Line((25.25, 0), (25.25, 2))
        make_face()
    extrude(amount=F2_T104_DEPTH)

    split(bisect_by=Plane.YZ.offset(25.5), keep=Keep.BOTTOM)


with BuildPart() as f2_tool98_1:
    add(f2_tool98.part)

    # F2_t106: intersect F2_tool102
    add(f2_tool102.part, mode=Mode.INTERSECT)


with BuildPart() as f1_8:
    add(f1_7.part)

    # F2_t96: cut F2_tool98
    add(f2_tool98_1.part, mode=Mode.SUBTRACT)


with BuildPart() as f2_tool109:
    # F2_s110 → F2_t111 (new body)
    with BuildSketch(Plane.YZ.offset(-21.5)):
        with BuildLine():
            ThreePointArc((22.25, 2), (23.3463763172, 0.5505102572), (25.0784271247, 0))
            Line((25.0784271247, 0), (22.25, 0))
            Line((22.25, 0), (22.25, 2))
        make_face()
    extrude(amount=F2_T111_DEPTH)

    split(bisect_by=Plane.YZ.offset(14.5), keep=Keep.TOP)


with BuildPart() as f2_tool113:
    # F2_s114 → F2_t115 (new body)
    with BuildSketch(Plane.XZ.offset(-29.3210678119)):
        with BuildLine():
            ThreePointArc((14.5, 2), (15.5963763172, 0.5505102572), (17.3284271247, 0))
            Line((17.3284271247, 0), (14.5, 0))
            Line((14.5, 0), (14.5, 2))
        make_face()
    extrude(amount=F2_T115_DEPTH)

    split(bisect_by=Plane.XZ.offset(-22.25), keep=Keep.BOTTOM)


with BuildPart() as f2_tool109_1:
    add(f2_tool109.part)

    # F2_t117: intersect F2_tool113
    add(f2_tool113.part, mode=Mode.INTERSECT)


with BuildPart() as f1_9:
    add(f1_8.part)

    # F2_t107: cut F2_tool109
    add(f2_tool109_1.part, mode=Mode.SUBTRACT)


with BuildPart() as f2_tool120:
    # F2_s121 → F2_t122 (new body)
    with BuildSketch(Plane.XZ.offset(-22.25)):
        with BuildLine():
            ThreePointArc((14.5, 2), (15.5963763172, 0.5505102572), (17.3284271247, 0))
            Line((17.3284271247, 0), (14.5, 0))
            Line((14.5, 0), (14.5, 2))
        make_face()
    extrude(amount=F2_T122_DEPTH)

    split(bisect_by=Plane.XZ.offset(9.75), keep=Keep.TOP)


with BuildPart() as f2_tool124:
    # F2_s125 → F2_t126 (new body)
    with BuildSketch(Plane.YZ.offset(21.5710678119)):
        with BuildLine():
            ThreePointArc((-9.75, 2), (-10.8463763172, 0.5505102572), (-12.5784271247, 0))
            Line((-12.5784271247, 0), (-9.75, 0))
            Line((-9.75, 0), (-9.75, 2))
        make_face()
    extrude(amount=-F2_T126_DEPTH)

    split(bisect_by=Plane.YZ.offset(14.5), keep=Keep.TOP)


with BuildPart() as f2_tool120_1:
    add(f2_tool120.part)

    # F2_t128: intersect F2_tool124
    add(f2_tool124.part, mode=Mode.INTERSECT)


with BuildPart() as f1_10:
    add(f1_9.part)

    # F2_t118: cut F2_tool120
    add(f2_tool120_1.part, mode=Mode.SUBTRACT)


with BuildPart() as f2_tool131:
    # F2_s132 → F2_t133 (new body)
    with BuildSketch(Plane.XZ.offset(16.8210678119)):
        with BuildLine():
            ThreePointArc((-21.5, 2), (-22.5963763172, 0.5505102572), (-24.3284271247, 0))
            Line((-24.3284271247, 0), (-21.5, 0))
            Line((-21.5, 0), (-21.5, 2))
        make_face()
    extrude(amount=-F2_T133_DEPTH)

    split(bisect_by=Plane.XZ.offset(9.75), keep=Keep.TOP)


with BuildPart() as f2_tool135:
    # F2_s136 → F2_t137 (new body)
    with BuildSketch(Plane.YZ.offset(14.5)):
        with BuildLine():
            ThreePointArc((-9.75, 2), (-10.8463763172, 0.5505102572), (-12.5784271247, 0))
            Line((-12.5784271247, 0), (-9.75, 0))
            Line((-9.75, 0), (-9.75, 2))
        make_face()
    extrude(amount=-F2_T137_DEPTH)

    split(bisect_by=Plane.YZ.offset(-24.9), keep=Keep.TOP)

    split(bisect_by=Plane.YZ.offset(-21.5), keep=Keep.BOTTOM)


with BuildPart() as f2_tool131_1:
    add(f2_tool131.part)

    # F2_t140: intersect F2_tool135
    add(f2_tool135.part, mode=Mode.INTERSECT)


with BuildPart() as f1_11:
    add(f1_10.part)

    # F2_t129: cut F2_tool131
    add(f2_tool131_1.part, mode=Mode.SUBTRACT)


with BuildPart() as f2_tool143:
    # F2_s144 → F2_t145 (new body)
    with BuildSketch(Plane.XZ.offset(9.75)):
        with BuildLine():
            ThreePointArc((-21.5, 2), (-22.5963763172, 0.5505102572), (-24.3284271247, 0))
            Line((-24.3284271247, 0), (-21.5, 0))
            Line((-21.5, 0), (-21.5, 2))
        make_face()
    extrude(amount=-F2_T145_DEPTH)

    split(bisect_by=Plane.XZ.offset(-22.25), keep=Keep.BOTTOM)


with BuildPart() as f2_tool147:
    # F2_s148 → F2_t149 (new body)
    with BuildSketch(Plane.YZ.offset(-28.5710678119)):
        with BuildLine():
            ThreePointArc((22.25, 2), (23.3463763172, 0.5505102572), (25.0784271247, 0))
            Line((25.0784271247, 0), (22.25, 0))
            Line((22.25, 0), (22.25, 2))
        make_face()
    extrude(amount=F2_T149_DEPTH)

    split(bisect_by=Plane.YZ.offset(-24.9), keep=Keep.TOP)

    split(bisect_by=Plane.YZ.offset(-21.5), keep=Keep.BOTTOM)


with BuildPart() as f2_tool143_1:
    add(f2_tool143.part)

    # F2_t152: intersect F2_tool147
    add(f2_tool147.part, mode=Mode.INTERSECT)


with BuildPart() as f1_12:
    add(f1_11.part)

    # F2_t141: cut F2_tool143
    add(f2_tool143_1.part, mode=Mode.SUBTRACT)

    # F3
    f3_edges = [f1_12.edges().sort_by_distance(p)[0] for p in [
        (-34.5, 41, 1),
        (34.5, 41, 1),
        (34.5, -41, 1),
        (-34.5, -41, 1),
    ]]
    fillet(f3_edges, radius=F3_R)

    # F0 (on Top) → F4 (join)
    with BuildSketch(Plane.XY):
        with Locations((-27.9, -2.5)):
            Rectangle(F0_W, F0_H)
    extrude(amount=F4_DEPTH)


solid = f1_12.part
